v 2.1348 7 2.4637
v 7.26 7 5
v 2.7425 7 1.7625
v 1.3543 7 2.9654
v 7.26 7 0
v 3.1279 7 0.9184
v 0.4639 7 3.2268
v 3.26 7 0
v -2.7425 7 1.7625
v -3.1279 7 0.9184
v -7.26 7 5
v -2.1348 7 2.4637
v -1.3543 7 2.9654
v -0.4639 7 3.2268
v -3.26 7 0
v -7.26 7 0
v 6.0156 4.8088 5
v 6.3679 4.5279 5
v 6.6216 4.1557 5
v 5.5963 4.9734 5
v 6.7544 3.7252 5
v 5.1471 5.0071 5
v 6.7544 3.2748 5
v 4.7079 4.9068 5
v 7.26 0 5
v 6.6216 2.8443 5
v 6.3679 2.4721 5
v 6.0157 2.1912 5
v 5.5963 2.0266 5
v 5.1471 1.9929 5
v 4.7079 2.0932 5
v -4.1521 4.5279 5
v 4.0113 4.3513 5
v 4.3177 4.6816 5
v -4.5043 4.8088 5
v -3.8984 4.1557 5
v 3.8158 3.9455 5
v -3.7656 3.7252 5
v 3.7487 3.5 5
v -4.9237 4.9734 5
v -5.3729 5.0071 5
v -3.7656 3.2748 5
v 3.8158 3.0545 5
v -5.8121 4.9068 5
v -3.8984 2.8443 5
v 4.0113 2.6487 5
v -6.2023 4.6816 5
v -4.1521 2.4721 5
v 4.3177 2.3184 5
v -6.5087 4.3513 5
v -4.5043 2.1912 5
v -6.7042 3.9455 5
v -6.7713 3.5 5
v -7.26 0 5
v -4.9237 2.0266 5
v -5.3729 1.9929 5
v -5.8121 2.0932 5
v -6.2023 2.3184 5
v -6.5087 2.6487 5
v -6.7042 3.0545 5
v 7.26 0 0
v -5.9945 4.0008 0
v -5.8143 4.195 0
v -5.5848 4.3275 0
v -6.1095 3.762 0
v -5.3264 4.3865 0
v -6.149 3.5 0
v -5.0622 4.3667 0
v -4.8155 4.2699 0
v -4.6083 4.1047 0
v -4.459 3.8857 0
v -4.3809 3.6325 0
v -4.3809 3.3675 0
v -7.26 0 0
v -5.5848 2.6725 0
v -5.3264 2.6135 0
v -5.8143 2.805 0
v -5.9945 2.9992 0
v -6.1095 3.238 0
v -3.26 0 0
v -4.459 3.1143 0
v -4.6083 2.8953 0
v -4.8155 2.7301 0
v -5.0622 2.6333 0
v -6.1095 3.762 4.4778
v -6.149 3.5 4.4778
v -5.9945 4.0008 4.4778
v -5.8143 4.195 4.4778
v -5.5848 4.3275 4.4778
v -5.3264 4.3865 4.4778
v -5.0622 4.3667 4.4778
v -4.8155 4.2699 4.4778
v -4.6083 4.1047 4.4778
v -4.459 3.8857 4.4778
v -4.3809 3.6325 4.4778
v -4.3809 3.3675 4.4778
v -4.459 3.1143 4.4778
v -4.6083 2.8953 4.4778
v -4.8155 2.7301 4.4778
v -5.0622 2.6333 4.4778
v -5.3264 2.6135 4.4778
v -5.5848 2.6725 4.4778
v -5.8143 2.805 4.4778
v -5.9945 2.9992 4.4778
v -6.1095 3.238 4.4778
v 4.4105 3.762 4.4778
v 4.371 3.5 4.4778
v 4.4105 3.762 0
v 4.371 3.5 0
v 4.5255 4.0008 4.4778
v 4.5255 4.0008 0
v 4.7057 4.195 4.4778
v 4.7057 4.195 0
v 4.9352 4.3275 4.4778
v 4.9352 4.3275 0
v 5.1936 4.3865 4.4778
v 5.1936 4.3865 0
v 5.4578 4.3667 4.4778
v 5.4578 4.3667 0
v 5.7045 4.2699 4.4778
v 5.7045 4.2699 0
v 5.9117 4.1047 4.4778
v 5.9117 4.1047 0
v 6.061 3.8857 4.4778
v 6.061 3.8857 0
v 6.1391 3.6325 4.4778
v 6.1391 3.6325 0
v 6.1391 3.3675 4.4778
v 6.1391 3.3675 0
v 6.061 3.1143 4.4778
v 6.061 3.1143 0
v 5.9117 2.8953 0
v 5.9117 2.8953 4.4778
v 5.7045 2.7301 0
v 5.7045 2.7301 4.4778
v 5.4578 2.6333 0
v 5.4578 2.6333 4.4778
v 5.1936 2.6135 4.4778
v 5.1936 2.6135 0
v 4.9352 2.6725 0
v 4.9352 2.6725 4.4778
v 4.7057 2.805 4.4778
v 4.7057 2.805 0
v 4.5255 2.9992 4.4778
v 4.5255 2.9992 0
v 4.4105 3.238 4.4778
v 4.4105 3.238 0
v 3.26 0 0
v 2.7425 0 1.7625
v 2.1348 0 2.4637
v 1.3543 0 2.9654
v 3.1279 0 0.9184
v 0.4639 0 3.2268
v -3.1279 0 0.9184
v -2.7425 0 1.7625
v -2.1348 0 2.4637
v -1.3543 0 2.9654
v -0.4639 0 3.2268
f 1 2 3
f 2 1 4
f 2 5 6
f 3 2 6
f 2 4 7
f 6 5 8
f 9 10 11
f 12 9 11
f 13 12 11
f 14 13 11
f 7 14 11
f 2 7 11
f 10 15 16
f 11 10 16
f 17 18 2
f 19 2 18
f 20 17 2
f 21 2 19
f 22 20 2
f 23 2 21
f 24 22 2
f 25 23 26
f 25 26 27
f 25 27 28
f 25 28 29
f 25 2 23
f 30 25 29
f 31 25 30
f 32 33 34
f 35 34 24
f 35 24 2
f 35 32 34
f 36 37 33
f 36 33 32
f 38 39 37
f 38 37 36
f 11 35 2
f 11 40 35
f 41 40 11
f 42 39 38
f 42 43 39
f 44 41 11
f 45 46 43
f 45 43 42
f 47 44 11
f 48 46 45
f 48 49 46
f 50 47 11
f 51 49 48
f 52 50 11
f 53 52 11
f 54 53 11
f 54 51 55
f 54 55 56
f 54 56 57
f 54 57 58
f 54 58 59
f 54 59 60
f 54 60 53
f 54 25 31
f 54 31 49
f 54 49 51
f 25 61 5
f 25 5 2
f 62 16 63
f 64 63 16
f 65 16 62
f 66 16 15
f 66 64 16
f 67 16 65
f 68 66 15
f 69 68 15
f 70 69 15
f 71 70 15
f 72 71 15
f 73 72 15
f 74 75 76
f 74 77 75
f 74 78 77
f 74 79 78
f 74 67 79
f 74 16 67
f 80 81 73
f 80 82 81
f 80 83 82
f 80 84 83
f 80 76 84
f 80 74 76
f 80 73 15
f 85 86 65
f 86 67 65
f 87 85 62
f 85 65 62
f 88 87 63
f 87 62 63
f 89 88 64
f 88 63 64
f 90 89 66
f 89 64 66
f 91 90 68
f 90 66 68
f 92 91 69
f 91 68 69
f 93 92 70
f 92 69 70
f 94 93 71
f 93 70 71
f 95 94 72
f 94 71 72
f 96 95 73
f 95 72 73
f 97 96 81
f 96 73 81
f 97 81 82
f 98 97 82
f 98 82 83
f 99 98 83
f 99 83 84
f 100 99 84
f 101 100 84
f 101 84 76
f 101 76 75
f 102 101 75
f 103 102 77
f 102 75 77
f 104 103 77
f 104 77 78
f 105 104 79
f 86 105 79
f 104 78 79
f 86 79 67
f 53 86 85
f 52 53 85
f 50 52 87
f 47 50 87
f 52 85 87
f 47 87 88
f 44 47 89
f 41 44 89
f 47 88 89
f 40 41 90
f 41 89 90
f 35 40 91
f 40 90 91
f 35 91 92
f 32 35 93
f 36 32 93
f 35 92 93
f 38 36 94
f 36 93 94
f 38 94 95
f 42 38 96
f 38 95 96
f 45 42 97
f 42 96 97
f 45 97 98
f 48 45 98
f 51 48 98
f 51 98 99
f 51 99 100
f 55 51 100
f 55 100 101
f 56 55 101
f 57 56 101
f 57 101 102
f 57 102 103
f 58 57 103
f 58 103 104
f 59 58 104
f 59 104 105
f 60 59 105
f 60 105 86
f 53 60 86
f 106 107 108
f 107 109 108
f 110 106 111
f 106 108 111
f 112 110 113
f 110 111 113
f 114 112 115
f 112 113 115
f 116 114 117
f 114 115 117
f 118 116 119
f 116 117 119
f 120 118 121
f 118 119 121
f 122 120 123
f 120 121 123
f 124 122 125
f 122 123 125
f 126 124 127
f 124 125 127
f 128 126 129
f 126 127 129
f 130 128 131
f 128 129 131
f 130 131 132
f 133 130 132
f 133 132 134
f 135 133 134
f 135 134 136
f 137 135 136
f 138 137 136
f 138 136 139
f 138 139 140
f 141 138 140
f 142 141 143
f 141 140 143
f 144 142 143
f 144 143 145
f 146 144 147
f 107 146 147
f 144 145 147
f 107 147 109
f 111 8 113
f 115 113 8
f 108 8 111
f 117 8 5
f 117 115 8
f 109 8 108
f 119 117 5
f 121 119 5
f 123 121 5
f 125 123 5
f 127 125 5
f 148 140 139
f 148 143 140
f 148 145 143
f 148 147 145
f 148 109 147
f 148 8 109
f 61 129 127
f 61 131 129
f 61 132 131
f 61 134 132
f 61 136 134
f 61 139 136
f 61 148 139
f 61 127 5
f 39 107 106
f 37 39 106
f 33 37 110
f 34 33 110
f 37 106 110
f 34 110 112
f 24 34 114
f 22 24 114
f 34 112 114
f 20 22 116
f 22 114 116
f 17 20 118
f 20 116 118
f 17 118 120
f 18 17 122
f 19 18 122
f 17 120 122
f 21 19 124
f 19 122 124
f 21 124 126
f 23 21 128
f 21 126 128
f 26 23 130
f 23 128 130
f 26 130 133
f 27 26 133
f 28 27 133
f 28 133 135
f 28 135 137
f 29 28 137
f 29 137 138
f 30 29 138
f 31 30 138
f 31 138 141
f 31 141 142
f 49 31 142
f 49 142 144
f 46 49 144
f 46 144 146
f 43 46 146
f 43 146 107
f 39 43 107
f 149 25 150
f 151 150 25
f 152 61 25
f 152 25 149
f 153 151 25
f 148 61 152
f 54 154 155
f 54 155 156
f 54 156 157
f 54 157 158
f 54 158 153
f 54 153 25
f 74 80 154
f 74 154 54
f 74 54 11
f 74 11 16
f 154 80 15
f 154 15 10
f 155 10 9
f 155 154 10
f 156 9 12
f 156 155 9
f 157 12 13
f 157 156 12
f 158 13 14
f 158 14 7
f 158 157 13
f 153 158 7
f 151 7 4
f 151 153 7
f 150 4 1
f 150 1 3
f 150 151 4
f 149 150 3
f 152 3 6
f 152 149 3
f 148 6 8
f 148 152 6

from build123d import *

# Parameters (mm, degrees)
BOSS_EXTRUDE1_DEPTH                               = 7
CSK_FOR_0_FLAT_HEAD_MACHINE_SCREW_100_D           = 1.778
CSK_FOR_0_FLAT_HEAD_MACHINE_SCREW_100_CSINK_D     = 3.0226
CSK_FOR_0_FLAT_HEAD_MACHINE_SCREW_100_CSINK_ANGLE = 100


with BuildPart() as part:
    # Sketch1 → Boss-Extrude1 (new body)
    with BuildSketch(Plane(origin=(0, 0, 0), x_dir=(1, 0, 0), z_dir=(0, 1, 0))):
        with BuildLine():
            Line((-7.26, 0), (-3.26, 0))
            ThreePointArc((-3.26, 0), (0, -3.26), (3.26, 0))
            Line((3.26, 0), (7.26, 0))
            Line((7.26, 0), (7.26, -5))
            Line((7.26, -5), (-7.26, -5))
            Line((-7.26, -5), (-7.26, 0))
        make_face()
    extrude(amount=BOSS_EXTRUDE1_DEPTH)

    # CSK for #0 Flat Head Machine Screw (100)1 (through all)
    with Locations(Plane.XY.offset(5)):
        with Locations((-5.26, 3.5), (5.26, 3.5)):
            CounterSinkHole(CSK_FOR_0_FLAT_HEAD_MACHINE_SCREW_100_D / 2, CSK_FOR_0_FLAT_HEAD_MACHINE_SCREW_100_CSINK_D / 2, counter_sink_angle=CSK_FOR_0_FLAT_HEAD_MACHINE_SCREW_100_CSINK_ANGLE)


solid = part.part
